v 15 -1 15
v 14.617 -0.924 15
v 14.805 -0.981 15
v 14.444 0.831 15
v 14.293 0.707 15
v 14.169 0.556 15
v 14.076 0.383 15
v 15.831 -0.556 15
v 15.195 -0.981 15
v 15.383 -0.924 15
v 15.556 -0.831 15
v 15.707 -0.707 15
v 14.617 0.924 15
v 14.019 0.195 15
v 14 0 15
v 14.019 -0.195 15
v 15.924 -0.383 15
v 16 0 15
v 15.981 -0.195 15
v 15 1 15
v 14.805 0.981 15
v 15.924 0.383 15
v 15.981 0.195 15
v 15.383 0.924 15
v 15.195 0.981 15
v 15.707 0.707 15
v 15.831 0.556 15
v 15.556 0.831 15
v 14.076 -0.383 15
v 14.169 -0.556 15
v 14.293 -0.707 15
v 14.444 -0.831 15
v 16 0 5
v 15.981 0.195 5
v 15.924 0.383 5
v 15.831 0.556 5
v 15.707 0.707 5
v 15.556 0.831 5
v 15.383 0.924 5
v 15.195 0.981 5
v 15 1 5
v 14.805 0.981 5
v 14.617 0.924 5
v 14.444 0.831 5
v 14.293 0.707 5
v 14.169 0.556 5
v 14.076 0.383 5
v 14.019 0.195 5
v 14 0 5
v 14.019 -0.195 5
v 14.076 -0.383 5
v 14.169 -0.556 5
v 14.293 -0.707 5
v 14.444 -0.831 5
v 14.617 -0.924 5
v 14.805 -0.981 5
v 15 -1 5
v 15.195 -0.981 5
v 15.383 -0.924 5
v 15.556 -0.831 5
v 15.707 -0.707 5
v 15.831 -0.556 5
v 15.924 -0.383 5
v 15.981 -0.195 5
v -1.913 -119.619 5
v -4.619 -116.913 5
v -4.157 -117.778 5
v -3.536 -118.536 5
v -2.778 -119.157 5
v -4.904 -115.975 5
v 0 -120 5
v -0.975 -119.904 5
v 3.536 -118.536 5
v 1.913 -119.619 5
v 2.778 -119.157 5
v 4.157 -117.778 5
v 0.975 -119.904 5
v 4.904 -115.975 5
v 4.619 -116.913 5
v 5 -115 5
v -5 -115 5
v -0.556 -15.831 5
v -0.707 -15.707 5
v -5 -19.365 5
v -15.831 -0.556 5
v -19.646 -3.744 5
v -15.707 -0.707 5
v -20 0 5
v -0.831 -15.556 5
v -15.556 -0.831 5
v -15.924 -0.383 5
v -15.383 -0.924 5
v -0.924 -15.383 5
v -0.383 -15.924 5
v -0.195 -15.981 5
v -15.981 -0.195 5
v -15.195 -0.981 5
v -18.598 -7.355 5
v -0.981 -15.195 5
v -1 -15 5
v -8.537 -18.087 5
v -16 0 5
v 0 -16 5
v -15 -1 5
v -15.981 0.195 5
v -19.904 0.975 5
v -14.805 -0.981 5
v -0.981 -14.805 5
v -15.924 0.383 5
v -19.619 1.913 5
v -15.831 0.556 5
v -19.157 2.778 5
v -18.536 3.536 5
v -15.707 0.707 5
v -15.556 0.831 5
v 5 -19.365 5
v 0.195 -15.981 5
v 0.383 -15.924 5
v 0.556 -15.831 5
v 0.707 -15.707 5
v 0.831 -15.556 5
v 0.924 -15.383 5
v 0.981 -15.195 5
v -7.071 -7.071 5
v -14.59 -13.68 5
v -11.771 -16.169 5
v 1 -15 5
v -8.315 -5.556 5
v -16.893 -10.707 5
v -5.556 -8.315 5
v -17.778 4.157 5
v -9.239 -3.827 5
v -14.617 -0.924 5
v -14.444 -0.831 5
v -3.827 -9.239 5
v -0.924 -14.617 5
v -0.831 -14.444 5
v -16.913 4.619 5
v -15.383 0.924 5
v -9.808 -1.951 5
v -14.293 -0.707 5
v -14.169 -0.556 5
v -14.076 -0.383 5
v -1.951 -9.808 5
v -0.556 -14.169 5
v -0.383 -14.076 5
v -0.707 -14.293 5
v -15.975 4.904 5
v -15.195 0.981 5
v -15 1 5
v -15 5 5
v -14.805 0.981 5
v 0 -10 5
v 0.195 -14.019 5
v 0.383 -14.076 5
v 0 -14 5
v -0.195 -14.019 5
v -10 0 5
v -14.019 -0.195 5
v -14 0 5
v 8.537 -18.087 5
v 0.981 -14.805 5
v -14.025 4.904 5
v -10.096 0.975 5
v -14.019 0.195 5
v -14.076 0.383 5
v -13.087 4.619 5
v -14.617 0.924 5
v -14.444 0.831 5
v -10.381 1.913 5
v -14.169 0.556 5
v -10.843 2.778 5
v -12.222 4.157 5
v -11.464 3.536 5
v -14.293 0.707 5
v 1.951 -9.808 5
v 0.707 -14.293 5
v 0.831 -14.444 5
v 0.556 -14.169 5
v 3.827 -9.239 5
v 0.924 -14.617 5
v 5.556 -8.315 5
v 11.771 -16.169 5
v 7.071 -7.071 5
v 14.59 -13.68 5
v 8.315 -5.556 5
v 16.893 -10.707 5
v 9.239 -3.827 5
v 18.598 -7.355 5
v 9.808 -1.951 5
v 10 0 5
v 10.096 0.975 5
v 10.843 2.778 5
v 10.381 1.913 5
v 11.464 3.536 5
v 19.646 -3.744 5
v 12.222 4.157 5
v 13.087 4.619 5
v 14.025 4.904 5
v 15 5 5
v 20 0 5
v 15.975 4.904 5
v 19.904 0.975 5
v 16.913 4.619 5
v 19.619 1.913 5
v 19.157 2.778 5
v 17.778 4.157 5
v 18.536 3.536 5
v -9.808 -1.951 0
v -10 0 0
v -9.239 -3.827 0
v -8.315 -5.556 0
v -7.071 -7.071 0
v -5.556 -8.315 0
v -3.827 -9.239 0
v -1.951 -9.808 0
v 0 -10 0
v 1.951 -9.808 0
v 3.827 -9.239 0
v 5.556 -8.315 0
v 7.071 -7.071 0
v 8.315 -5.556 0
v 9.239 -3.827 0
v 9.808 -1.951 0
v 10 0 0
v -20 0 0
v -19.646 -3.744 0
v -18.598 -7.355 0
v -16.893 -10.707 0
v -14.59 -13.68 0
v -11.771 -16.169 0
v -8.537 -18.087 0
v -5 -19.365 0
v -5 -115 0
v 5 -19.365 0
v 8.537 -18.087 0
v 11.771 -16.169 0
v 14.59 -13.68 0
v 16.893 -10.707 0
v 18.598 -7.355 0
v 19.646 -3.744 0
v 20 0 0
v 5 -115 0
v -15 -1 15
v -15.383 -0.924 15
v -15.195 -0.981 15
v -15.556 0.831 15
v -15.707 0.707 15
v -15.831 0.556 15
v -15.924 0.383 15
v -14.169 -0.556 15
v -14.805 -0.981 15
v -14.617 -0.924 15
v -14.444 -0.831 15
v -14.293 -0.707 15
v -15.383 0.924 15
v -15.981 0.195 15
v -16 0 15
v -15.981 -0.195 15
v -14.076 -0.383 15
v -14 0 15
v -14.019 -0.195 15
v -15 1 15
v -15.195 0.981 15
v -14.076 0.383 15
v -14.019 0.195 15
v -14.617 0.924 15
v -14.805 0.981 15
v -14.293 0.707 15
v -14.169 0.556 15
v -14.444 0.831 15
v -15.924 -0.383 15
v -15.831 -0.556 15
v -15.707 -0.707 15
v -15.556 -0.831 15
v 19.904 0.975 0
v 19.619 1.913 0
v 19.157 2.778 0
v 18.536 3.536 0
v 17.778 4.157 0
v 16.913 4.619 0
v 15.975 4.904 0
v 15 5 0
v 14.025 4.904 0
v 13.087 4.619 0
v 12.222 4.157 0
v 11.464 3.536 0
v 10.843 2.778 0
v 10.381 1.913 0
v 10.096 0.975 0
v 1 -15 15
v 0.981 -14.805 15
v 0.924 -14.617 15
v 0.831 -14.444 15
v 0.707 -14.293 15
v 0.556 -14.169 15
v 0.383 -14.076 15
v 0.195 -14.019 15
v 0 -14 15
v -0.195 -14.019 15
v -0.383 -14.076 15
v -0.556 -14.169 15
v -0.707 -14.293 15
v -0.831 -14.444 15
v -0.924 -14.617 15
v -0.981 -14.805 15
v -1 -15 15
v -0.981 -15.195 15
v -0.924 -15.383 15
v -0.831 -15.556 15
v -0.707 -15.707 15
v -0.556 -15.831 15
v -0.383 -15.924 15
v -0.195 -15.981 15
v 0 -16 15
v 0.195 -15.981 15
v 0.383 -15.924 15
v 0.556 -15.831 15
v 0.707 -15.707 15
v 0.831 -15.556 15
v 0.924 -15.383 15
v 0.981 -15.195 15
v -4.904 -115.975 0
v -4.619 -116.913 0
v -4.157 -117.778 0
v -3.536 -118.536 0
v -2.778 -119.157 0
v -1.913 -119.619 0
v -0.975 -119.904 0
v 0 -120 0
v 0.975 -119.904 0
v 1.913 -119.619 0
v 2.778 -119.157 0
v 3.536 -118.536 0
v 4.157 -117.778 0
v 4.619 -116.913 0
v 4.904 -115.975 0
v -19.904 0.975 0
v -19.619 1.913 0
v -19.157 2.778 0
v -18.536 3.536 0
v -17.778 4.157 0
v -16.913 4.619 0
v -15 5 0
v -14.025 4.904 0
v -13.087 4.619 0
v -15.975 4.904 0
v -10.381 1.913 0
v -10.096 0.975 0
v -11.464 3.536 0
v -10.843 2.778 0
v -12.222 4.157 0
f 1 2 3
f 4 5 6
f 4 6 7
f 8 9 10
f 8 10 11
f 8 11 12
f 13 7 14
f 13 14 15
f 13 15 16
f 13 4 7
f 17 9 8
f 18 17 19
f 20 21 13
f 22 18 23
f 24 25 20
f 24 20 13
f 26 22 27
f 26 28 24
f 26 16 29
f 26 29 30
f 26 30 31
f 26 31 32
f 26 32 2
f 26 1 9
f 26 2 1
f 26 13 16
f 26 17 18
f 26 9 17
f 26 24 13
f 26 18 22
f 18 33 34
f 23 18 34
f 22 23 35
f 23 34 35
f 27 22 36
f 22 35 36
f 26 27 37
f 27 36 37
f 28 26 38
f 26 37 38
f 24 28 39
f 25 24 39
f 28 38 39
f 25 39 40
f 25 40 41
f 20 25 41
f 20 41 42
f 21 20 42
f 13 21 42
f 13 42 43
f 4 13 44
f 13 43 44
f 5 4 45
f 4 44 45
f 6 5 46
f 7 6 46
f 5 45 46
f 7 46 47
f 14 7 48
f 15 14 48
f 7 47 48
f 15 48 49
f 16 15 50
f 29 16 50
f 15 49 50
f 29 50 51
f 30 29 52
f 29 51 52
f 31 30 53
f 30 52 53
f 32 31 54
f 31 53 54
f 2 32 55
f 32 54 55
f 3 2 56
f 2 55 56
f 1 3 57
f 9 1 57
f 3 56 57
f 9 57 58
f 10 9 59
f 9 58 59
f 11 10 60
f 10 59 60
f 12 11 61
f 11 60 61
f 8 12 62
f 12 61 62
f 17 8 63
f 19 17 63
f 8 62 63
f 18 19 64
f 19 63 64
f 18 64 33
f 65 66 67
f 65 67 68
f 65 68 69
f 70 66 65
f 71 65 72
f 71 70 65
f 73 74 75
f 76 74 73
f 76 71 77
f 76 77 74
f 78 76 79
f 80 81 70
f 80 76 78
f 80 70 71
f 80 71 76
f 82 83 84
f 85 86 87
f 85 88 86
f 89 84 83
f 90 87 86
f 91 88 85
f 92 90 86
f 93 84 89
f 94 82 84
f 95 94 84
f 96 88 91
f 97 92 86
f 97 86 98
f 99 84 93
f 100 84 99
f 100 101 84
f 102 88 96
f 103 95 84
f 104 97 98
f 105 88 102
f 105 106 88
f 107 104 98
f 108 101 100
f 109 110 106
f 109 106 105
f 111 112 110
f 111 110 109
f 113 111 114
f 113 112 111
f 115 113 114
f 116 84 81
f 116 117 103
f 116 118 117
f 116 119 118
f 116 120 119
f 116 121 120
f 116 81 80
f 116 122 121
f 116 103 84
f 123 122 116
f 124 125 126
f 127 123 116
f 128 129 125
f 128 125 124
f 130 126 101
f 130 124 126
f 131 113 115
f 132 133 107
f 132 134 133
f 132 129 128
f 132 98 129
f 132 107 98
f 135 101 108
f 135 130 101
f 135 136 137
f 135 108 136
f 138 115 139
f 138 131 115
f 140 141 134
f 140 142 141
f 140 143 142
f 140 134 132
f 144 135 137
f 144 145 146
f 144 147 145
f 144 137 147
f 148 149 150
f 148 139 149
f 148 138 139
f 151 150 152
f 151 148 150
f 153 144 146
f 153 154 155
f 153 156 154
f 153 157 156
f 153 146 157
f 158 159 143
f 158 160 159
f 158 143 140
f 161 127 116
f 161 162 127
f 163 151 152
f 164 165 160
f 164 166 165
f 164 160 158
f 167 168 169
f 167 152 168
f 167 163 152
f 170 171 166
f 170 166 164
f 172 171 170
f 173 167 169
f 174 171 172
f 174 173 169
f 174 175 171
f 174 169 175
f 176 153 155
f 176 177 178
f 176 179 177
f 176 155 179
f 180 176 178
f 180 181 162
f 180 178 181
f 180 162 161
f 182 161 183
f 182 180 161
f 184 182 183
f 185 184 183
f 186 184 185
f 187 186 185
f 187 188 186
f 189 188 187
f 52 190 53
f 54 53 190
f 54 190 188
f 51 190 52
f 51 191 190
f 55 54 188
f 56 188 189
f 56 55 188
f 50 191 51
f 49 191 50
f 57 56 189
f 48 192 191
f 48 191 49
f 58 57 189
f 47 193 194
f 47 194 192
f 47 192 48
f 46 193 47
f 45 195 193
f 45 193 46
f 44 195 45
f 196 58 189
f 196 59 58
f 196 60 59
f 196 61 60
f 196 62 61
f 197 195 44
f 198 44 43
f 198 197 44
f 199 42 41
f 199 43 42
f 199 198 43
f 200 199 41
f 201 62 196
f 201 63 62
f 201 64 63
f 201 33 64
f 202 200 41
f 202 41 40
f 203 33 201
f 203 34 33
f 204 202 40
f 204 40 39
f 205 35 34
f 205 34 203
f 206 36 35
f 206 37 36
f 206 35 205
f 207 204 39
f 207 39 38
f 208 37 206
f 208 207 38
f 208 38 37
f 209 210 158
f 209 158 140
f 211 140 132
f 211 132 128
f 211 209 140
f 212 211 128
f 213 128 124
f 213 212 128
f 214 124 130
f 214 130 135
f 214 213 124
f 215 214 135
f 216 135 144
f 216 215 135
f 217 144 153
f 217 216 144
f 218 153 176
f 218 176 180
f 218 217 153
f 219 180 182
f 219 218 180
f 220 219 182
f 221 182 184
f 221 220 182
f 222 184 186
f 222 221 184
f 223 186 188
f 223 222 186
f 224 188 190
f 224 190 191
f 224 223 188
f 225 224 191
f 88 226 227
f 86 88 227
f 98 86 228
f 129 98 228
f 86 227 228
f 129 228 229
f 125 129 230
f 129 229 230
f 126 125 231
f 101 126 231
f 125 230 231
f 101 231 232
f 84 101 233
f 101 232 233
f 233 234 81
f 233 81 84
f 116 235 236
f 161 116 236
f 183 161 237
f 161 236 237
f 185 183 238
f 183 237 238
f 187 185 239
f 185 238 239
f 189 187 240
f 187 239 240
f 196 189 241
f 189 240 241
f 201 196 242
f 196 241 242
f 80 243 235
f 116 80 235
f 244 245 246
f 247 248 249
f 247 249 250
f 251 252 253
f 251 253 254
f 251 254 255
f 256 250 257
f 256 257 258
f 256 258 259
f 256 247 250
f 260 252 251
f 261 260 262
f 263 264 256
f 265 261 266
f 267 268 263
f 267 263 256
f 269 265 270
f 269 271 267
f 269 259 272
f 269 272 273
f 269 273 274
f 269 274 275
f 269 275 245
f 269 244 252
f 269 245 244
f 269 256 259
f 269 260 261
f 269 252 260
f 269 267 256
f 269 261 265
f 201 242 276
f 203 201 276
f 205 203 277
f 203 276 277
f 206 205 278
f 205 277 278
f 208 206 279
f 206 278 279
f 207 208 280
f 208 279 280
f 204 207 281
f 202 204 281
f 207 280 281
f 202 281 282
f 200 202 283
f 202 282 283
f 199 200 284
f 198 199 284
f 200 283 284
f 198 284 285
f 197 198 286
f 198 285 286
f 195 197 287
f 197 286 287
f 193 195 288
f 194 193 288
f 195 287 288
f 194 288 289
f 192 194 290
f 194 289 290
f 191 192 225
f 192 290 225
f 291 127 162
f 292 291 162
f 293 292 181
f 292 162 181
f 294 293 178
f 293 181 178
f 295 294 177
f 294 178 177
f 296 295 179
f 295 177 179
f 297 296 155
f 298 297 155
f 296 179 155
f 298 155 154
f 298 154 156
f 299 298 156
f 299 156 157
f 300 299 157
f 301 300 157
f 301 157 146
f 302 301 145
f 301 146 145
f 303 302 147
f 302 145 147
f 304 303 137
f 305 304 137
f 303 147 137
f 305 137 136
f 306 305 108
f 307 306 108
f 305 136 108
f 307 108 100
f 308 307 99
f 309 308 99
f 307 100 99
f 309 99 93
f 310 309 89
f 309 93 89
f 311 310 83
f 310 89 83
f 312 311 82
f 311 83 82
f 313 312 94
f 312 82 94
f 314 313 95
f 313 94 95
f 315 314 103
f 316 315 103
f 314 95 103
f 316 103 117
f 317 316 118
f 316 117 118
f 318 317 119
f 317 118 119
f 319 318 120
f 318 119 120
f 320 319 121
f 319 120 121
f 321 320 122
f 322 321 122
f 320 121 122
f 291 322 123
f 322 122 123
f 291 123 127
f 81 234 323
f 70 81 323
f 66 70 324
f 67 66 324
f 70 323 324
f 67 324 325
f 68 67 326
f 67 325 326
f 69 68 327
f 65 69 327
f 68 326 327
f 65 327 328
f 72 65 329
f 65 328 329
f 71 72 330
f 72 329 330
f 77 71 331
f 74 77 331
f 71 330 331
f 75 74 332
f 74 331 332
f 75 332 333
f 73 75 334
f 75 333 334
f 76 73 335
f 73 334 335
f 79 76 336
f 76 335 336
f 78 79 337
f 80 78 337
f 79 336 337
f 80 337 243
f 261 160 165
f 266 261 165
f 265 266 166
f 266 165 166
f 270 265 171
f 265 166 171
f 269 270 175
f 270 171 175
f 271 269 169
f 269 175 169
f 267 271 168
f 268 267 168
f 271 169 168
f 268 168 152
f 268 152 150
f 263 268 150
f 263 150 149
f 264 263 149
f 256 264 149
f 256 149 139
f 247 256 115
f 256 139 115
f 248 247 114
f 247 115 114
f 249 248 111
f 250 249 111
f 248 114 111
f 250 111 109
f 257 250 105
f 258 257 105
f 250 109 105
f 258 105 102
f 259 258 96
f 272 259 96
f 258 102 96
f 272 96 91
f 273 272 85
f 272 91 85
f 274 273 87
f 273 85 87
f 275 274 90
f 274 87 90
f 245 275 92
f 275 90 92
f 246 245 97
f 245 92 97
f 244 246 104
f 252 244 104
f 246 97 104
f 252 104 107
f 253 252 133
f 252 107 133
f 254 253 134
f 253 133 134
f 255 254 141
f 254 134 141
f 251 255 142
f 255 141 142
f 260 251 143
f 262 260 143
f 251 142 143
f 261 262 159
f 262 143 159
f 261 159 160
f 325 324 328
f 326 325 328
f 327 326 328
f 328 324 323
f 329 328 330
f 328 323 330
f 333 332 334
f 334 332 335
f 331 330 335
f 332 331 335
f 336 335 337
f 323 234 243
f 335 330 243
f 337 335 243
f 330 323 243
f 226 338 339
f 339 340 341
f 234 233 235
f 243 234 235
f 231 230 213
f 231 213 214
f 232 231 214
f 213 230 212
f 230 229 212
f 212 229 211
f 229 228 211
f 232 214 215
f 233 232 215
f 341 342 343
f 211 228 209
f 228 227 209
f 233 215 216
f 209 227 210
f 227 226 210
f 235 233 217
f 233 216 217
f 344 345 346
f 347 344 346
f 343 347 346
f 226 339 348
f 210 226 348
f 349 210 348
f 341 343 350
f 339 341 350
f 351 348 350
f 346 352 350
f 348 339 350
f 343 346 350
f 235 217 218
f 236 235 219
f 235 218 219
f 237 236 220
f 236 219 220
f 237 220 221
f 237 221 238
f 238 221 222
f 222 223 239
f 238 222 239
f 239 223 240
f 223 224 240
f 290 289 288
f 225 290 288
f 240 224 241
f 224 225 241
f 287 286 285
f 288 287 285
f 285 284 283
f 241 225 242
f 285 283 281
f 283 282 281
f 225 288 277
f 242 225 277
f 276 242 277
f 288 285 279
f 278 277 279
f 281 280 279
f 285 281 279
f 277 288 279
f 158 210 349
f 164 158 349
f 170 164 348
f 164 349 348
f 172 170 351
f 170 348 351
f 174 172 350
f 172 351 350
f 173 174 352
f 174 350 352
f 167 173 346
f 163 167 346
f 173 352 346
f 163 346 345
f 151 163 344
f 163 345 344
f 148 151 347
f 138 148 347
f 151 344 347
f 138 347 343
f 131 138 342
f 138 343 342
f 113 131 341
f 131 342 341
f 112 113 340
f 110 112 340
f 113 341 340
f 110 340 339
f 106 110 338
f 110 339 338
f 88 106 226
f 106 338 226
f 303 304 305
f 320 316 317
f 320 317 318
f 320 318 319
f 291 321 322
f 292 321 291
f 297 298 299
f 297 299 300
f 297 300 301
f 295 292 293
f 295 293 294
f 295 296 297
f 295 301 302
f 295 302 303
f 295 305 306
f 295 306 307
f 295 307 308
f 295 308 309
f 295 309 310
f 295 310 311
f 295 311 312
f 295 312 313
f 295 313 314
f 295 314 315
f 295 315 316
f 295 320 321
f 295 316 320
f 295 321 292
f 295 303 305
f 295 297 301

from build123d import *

# Parameters (mm, degrees)
BOX001_W          = 10
BOX001_H          = 100
BOX001_DEPTH      = 5
CYLINDER004_R     = 1
CYLINDER004_DEPTH = 10
CYLINDER005_R     = 1
CYLINDER005_DEPTH = 10
CYLINDER006_R     = 1
CYLINDER006_DEPTH = 10
CYLINDER007_R     = 5
CYLINDER007_DEPTH = 5
CYLINDER002_R     = 5
CYLINDER002_DEPTH = 5
CYLINDER003_R     = 5
CYLINDER003_DEPTH = 5
BOX_W             = 40
BOX_H             = 35
BOX_DEPTH         = 5
CYLINDER_R        = 10
CYLINDER_DEPTH    = 5
CYLINDER001_R     = 20
CYLINDER001_DEPTH = 5


with BuildPart() as cube001:
    # Box001 → Box001 (new body)
    with BuildSketch(Plane(origin=(-5, -115, 0), x_dir=(1, 0, 0), z_dir=(0, 0, 1))):
        with Locations((5, 50)):
            Rectangle(BOX001_W, BOX001_H)
    extrude(amount=BOX001_DEPTH)


with BuildPart() as cylinder004:
    # Cylinder004 → Cylinder004 (new body)
    with BuildSketch(Plane(origin=(0, -15, 5), x_dir=(1, 0, 0), z_dir=(0, 0, 1))):
        Circle(CYLINDER004_R)
    extrude(amount=CYLINDER004_DEPTH)


with BuildPart() as cylinder005:
    # Cylinder005 → Cylinder005 (new body)
    with BuildSketch(Plane(origin=(15, 0, 5), x_dir=(1, 0, 0), z_dir=(0, 0, 1))):
        Circle(CYLINDER005_R)
    extrude(amount=CYLINDER005_DEPTH)


with BuildPart() as cylinder006:
    # Cylinder006 → Cylinder006 (new body)
    with BuildSketch(Plane(origin=(-15, 0, 5), x_dir=(1, 0, 0), z_dir=(0, 0, 1))):
        Circle(CYLINDER006_R)
    extrude(amount=CYLINDER006_DEPTH)


with BuildPart() as cylinder007:
    # Cylinder007 → Cylinder007 (new body)
    with BuildSketch(Plane(origin=(0, -115, 0), x_dir=(1, 0, 0), z_dir=(0, 0, 1))):
        Circle(CYLINDER007_R)
    extrude(amount=CYLINDER007_DEPTH)


with BuildPart() as cylinder002:
    # Cylinder002 → Cylinder002 (new body)
    with BuildSketch(Plane(origin=(15, 0, 0), x_dir=(1, 0, 0), z_dir=(0, 0, 1))):
        Circle(CYLINDER002_R)
    extrude(amount=CYLINDER002_DEPTH)


with BuildPart() as cylinder003:
    # Cylinder003 → Cylinder003 (new body)
    with BuildSketch(Plane(origin=(-15, 0, 0), x_dir=(1, 0, 0), z_dir=(0, 0, 1))):
        Circle(CYLINDER003_R)
    extrude(amount=CYLINDER003_DEPTH)


with BuildPart() as cube:
    # Box → Box (new body)
    with BuildSketch(Plane(origin=(-20, 0, 0), x_dir=(1, 0, 0), z_dir=(0, 0, 1))):
        with Locations((20, 17.5)):
            Rectangle(BOX_W, BOX_H)
    extrude(amount=BOX_DEPTH)


with BuildPart() as cylinder:
    # Cylinder → Cylinder (new body)
    with BuildSketch(Plane.XY):
        Circle(CYLINDER_R)
    extrude(amount=CYLINDER_DEPTH)


with BuildPart() as baseconfigurablepinwrench:
    # Cylinder001 → Cylinder001 (new body)
    with BuildSketch(Plane.XY):
        Circle(CYLINDER001_R)
    extrude(amount=CYLINDER001_DEPTH)

    # Cut: cut Cylinder
    add(cylinder.part, mode=Mode.SUBTRACT)

    # Cut001: cut Cube
    add(cube.part, mode=Mode.SUBTRACT)

    # Fusion: union Cylinder002, Cylinder003
    add(cylinder002.part)
    add(cylinder003.part)

    # Fusion001: union Cube001, Cylinder004, Cylinder005, Cylinder006, Cylinder007
    add(cube001.part)
    add(cylinder004.part)
    add(cylinder005.part)
    add(cylinder006.part)
    add(cylinder007.part)


solid = baseconfigurablepinwrench.part
